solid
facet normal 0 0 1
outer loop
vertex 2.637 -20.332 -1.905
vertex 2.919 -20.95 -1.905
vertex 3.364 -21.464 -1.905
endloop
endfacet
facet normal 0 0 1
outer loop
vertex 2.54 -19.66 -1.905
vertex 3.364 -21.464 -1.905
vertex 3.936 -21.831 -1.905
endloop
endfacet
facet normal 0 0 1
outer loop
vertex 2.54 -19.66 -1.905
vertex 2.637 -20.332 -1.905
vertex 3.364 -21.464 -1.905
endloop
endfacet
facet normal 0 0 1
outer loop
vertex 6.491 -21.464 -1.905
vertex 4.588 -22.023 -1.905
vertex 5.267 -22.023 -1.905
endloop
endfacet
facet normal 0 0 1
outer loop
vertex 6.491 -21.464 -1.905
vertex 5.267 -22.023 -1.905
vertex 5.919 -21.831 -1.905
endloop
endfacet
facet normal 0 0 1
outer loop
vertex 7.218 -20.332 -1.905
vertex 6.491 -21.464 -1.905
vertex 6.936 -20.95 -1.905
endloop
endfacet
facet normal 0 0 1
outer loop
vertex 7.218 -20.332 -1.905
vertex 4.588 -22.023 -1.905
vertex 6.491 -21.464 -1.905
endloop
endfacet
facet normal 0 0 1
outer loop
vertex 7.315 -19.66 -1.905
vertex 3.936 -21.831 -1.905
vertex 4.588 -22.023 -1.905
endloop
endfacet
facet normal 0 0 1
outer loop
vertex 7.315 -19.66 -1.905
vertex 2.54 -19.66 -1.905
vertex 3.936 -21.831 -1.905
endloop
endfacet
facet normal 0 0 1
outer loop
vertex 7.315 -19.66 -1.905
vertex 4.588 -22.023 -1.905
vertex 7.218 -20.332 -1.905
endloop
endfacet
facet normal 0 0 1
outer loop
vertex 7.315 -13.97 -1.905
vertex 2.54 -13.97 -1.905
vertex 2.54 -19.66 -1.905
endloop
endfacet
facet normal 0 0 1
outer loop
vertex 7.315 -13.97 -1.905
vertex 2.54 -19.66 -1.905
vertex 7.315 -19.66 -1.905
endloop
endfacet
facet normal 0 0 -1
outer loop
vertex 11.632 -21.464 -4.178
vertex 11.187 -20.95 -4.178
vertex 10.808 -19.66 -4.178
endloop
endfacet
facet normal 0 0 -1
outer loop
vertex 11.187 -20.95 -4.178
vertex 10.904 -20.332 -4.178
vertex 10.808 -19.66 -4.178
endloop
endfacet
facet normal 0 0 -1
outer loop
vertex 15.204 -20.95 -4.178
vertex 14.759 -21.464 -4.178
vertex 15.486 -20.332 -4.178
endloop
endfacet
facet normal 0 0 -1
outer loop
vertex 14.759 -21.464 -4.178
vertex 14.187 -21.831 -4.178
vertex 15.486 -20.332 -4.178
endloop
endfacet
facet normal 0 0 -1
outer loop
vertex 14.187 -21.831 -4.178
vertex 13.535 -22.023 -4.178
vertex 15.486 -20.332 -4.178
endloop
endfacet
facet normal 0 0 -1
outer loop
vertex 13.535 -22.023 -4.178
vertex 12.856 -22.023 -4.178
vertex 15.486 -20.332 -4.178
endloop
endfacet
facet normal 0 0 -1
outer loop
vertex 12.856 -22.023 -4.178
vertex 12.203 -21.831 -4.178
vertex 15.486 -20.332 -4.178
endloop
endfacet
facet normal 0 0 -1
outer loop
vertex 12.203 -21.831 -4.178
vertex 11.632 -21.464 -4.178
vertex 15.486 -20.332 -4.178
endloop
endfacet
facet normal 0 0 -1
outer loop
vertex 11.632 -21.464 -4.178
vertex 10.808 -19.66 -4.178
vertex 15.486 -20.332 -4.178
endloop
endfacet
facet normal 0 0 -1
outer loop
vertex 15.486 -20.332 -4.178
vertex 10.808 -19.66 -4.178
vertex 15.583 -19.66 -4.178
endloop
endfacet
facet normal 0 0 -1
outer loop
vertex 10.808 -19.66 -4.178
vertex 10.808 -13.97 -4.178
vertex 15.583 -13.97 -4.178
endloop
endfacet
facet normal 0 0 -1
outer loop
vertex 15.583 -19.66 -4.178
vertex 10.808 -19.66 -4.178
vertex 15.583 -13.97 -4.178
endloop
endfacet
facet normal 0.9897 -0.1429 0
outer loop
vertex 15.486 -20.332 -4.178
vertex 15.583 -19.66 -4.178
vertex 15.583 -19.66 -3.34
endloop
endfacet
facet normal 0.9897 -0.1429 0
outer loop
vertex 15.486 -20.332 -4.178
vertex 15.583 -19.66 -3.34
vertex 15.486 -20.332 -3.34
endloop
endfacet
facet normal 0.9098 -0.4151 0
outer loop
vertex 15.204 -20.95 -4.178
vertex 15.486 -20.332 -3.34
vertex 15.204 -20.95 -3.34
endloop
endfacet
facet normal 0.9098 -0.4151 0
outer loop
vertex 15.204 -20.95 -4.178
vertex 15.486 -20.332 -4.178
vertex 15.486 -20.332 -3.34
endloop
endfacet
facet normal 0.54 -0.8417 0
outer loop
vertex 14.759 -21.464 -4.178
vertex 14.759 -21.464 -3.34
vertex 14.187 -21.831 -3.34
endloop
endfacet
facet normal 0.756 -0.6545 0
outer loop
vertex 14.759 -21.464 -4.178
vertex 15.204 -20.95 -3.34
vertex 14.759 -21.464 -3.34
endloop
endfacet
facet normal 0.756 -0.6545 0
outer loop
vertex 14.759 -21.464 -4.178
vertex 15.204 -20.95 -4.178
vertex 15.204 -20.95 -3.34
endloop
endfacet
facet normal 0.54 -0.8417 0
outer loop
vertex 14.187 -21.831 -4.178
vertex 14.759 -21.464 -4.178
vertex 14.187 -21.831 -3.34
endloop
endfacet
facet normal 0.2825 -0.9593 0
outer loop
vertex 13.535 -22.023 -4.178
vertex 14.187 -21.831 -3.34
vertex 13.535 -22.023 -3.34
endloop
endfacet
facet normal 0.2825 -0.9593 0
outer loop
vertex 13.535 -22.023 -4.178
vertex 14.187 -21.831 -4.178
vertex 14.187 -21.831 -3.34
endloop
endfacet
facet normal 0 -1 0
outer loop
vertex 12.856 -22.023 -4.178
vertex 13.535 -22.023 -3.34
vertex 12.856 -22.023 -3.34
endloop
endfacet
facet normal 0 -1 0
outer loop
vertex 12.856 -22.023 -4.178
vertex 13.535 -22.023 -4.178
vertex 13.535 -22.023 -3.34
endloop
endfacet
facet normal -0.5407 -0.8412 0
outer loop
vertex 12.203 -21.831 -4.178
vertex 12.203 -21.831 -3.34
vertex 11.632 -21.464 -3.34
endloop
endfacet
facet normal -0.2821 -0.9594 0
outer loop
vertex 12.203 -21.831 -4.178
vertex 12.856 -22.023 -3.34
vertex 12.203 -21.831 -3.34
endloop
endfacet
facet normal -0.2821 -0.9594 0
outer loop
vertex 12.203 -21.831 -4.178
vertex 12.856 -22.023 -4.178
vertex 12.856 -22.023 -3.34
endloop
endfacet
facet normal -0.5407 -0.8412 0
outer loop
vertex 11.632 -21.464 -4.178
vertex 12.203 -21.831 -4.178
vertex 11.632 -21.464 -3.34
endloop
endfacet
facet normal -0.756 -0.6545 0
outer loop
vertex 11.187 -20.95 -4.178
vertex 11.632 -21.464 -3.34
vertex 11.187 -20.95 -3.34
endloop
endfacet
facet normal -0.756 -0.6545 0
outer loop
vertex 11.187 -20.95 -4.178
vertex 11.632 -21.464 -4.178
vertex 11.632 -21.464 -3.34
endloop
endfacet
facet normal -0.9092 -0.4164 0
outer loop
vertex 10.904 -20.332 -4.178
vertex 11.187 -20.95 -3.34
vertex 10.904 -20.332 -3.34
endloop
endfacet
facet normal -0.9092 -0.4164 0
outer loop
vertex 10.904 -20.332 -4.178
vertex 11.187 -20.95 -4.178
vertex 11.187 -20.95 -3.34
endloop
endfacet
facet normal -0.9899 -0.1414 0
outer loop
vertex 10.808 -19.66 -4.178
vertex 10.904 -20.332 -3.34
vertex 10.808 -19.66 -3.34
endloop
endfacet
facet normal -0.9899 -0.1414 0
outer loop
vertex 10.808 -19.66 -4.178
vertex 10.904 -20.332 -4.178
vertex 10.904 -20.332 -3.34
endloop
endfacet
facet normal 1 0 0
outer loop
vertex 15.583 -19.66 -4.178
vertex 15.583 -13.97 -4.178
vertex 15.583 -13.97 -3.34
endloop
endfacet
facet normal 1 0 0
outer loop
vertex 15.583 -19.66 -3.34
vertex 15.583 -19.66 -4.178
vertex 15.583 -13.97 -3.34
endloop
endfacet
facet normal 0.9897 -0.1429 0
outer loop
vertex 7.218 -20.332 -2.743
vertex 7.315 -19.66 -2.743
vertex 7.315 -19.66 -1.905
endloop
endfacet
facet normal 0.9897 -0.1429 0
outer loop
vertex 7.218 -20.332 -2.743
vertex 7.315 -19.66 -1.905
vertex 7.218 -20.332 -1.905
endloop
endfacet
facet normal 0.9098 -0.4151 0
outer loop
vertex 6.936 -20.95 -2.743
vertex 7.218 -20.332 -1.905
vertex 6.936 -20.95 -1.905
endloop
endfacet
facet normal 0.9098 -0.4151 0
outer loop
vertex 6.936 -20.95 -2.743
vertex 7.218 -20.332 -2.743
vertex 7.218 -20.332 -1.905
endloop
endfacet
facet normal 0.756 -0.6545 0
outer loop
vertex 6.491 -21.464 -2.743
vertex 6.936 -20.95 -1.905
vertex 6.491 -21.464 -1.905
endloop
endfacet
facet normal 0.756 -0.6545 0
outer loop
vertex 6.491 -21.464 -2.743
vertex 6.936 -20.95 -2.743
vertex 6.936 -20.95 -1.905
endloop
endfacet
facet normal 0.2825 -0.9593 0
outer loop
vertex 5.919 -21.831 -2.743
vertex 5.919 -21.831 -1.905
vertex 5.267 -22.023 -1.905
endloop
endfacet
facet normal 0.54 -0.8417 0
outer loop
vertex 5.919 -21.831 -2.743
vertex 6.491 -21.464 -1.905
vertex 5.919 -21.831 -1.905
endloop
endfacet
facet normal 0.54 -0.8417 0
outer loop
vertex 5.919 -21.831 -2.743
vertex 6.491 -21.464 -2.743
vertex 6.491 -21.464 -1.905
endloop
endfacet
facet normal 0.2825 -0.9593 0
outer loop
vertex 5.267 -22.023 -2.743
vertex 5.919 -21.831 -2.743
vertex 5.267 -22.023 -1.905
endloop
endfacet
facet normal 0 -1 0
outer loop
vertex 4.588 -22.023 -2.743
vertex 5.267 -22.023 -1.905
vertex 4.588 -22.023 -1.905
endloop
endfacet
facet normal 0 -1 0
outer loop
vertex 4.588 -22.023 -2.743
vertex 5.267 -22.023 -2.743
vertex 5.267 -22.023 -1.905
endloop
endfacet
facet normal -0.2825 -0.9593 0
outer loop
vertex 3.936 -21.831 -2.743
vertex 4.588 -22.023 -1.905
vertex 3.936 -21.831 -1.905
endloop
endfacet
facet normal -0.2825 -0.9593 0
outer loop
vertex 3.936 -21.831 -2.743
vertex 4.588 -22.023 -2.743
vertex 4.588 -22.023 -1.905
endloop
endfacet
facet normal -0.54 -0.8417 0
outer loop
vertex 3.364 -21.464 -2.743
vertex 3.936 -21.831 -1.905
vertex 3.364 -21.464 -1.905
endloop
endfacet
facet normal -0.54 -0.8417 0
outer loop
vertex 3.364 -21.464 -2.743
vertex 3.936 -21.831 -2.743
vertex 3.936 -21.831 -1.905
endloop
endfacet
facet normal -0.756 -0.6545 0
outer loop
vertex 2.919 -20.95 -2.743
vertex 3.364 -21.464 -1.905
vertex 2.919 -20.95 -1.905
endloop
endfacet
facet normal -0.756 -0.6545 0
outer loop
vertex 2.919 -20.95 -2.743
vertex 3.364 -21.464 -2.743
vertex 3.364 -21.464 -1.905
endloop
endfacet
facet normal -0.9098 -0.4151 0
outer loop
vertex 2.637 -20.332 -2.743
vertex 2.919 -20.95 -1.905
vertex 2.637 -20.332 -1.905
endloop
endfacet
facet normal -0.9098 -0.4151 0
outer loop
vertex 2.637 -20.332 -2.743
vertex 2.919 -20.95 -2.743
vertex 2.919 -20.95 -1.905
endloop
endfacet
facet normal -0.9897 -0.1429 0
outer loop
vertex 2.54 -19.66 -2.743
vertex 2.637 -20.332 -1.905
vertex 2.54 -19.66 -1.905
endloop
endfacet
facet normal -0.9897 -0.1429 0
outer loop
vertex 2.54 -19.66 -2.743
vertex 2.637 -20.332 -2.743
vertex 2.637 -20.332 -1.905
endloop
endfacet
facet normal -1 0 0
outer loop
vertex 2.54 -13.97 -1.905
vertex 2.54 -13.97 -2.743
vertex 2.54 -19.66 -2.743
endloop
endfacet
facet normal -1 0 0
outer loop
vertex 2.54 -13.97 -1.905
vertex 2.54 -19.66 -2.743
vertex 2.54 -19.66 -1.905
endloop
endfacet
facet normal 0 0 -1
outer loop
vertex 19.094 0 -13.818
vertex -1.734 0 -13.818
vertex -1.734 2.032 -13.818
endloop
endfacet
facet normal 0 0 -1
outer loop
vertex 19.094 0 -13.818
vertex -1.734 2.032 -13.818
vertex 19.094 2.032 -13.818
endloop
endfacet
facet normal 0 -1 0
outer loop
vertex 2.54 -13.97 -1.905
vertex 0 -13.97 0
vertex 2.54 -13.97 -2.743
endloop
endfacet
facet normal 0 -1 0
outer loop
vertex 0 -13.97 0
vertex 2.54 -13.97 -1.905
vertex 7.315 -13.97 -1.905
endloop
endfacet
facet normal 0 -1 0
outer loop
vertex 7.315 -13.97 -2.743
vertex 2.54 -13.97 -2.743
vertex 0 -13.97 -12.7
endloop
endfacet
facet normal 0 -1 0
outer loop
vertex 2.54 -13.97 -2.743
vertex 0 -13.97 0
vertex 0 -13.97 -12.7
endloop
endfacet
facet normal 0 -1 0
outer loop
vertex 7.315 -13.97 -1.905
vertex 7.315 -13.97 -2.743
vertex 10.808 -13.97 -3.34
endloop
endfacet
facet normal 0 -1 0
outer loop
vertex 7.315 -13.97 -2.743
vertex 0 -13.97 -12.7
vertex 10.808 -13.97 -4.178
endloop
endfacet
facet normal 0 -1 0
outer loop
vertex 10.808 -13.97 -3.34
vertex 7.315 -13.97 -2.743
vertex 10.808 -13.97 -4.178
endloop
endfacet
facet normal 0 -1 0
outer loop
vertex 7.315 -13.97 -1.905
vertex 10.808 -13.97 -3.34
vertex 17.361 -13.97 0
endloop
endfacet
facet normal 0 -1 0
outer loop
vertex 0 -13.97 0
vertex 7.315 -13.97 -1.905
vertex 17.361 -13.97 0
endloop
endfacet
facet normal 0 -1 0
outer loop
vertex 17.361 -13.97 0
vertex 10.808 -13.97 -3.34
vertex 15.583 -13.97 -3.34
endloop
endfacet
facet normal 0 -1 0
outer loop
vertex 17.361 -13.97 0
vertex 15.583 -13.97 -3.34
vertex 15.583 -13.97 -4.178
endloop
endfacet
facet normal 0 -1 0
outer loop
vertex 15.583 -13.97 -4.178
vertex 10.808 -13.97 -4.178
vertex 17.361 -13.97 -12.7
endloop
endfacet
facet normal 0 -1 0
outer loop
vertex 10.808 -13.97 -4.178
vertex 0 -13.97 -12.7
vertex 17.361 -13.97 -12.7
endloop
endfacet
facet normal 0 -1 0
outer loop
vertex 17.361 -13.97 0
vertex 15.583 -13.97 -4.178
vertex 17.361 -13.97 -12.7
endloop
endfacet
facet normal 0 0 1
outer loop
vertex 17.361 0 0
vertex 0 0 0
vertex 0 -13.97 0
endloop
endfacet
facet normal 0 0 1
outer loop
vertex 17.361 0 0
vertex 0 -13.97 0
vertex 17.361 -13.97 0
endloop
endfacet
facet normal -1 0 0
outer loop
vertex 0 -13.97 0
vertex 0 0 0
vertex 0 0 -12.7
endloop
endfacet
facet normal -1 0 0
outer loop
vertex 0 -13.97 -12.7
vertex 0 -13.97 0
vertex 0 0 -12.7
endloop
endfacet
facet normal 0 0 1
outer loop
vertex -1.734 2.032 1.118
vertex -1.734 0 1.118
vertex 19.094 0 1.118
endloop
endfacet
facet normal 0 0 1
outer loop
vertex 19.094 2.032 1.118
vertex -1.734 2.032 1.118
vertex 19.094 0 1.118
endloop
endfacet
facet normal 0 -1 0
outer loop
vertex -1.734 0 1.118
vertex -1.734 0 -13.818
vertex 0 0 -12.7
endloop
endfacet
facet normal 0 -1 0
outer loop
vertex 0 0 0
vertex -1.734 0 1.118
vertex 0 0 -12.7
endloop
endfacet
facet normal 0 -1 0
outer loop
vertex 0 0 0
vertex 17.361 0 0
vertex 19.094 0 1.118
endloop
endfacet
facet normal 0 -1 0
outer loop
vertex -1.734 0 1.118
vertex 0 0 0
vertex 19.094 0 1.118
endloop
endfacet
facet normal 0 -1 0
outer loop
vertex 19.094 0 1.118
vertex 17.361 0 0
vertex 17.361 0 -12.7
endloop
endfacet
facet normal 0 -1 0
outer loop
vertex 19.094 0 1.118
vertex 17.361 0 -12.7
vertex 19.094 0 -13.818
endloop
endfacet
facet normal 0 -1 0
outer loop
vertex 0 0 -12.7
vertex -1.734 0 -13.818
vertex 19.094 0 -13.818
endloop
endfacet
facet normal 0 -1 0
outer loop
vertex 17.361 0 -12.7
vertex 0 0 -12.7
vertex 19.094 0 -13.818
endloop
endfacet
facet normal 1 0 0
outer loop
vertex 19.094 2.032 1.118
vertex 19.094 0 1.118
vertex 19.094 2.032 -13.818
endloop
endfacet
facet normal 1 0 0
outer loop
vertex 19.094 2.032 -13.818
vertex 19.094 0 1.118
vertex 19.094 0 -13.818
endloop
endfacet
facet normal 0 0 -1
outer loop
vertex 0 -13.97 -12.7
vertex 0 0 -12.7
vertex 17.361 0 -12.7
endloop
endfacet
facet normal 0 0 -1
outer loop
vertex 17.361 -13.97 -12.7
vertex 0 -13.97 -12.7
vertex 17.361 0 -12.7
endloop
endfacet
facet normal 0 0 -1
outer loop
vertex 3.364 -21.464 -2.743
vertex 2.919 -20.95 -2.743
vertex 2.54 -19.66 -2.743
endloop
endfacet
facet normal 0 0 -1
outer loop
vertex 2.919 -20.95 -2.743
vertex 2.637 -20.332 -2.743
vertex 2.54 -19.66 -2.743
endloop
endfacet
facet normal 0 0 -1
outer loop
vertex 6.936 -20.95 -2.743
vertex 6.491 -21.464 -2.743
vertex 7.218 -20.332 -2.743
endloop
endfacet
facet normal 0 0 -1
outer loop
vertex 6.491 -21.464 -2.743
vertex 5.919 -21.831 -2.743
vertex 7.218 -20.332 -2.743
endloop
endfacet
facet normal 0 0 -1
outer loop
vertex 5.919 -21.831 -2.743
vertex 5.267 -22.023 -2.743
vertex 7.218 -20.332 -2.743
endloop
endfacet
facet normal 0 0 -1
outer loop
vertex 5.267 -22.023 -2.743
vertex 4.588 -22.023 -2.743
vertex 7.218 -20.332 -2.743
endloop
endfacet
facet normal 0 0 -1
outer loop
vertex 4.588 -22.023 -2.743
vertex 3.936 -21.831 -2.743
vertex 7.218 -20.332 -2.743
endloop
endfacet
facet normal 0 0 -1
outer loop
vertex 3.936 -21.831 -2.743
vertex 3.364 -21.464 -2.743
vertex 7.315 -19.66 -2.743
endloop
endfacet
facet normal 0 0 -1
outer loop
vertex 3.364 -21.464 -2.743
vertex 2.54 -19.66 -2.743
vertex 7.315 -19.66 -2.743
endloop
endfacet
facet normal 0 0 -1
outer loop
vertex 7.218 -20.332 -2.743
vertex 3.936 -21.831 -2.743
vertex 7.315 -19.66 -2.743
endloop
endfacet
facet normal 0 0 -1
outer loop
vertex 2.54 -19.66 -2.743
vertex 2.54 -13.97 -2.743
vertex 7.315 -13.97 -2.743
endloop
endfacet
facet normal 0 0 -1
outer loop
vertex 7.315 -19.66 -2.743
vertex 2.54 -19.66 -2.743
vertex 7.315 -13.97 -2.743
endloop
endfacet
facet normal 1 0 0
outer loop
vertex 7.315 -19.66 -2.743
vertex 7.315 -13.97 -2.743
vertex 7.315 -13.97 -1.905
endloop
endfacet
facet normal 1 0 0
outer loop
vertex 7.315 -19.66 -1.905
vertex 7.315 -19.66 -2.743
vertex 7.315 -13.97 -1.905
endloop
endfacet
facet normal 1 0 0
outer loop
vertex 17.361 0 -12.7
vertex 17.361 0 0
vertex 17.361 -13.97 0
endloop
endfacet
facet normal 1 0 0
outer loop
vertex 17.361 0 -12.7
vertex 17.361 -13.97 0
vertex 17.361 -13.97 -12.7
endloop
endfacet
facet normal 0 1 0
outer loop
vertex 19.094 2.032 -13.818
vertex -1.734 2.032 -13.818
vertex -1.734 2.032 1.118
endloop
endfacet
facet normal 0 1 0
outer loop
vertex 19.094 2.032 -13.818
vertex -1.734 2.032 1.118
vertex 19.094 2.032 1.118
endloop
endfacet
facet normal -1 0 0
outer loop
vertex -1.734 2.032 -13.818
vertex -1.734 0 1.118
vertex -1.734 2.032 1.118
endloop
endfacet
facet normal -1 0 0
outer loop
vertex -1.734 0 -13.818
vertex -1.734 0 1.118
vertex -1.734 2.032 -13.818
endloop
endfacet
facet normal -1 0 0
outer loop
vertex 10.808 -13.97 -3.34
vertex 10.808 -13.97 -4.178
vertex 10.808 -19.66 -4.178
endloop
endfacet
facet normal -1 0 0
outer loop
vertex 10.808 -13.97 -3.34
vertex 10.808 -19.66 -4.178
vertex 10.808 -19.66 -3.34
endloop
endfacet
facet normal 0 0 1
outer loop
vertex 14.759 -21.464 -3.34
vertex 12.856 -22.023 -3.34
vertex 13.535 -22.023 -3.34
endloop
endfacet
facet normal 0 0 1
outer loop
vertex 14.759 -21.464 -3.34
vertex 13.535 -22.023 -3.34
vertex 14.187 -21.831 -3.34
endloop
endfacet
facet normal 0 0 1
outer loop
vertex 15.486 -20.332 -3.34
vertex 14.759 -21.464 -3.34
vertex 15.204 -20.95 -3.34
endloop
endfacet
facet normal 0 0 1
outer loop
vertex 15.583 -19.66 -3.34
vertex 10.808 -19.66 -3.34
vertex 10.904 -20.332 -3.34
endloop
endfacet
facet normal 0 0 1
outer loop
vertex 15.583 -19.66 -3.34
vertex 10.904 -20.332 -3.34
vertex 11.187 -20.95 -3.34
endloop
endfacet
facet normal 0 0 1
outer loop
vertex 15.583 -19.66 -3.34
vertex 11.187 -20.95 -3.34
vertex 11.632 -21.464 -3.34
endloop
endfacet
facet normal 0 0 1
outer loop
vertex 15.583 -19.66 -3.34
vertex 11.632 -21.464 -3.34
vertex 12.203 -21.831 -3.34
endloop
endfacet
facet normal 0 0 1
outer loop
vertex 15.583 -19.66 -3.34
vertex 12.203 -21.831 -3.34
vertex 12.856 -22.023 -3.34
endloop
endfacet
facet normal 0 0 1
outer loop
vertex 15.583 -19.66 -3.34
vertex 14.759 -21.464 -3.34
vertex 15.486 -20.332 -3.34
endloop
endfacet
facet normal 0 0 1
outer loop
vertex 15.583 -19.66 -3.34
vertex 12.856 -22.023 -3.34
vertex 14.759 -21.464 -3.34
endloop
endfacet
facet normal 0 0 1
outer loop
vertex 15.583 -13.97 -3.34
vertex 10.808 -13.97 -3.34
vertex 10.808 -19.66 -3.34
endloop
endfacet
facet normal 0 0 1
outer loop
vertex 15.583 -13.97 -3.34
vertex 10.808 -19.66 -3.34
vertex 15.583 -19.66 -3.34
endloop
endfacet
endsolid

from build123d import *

# Parameters (mm, degrees)
SKETCH1_W           = 17.3609
SKETCH1_H           = 12.7
BOSS_EXTRUDE1_DEPTH = 13.97
SKETCH2_W           = 20.828
SKETCH2_H           = 14.9352
BOSS_EXTRUDE2_DEPTH = 2.032
SKETCH3_W           = 4.7752
SKETCH3_H           = 0.8382
BOSS_EXTRUDE3_DEPTH = 8.0772
FILLET1_RADIUS      = 2.3876
FILLET1_LENGTH      = 0.8382
FILLET2_RADIUS      = 2.3876
FILLET2_LENGTH      = 0.8382


with BuildPart() as part:
    # Sketch1 → Boss-Extrude1 (new body)
    with BuildSketch(Plane(origin=(0, 0, 0), x_dir=(1, 0, 0), z_dir=(0, 1, 0))):
        with Locations((8.68045, 6.35)):
            Rectangle(SKETCH1_W, SKETCH1_H)
    extrude(amount=-BOSS_EXTRUDE1_DEPTH)

    # Sketch2 → Boss-Extrude2 (add)
    with BuildSketch(Plane(origin=(0, 0, 0), x_dir=(1, 0, 0), z_dir=(0, 1, 0))):
        with Locations((8.68045, 6.35)):
            Rectangle(SKETCH2_W, SKETCH2_H)
    extrude(amount=BOSS_EXTRUDE2_DEPTH)

    # Sketch3 → Boss-Extrude3 (add)
    with BuildSketch(Plane.XZ.offset(13.97)):
        with Locations((4.9276, -2.3241)):
            Rectangle(SKETCH3_W, SKETCH3_H)
        with Locations((13.1953, -3.7592)):
            Rectangle(SKETCH3_W, SKETCH3_H)
    extrude(amount=BOSS_EXTRUDE3_DEPTH)

    # Fillet1: full round fillet: the end face becomes a half cylinder, R = half its width
    fillet1_face = Plane((4.9276, -22.0472, -2.3241), x_dir=(0, 0, -1), z_dir=(0, -1, 0))  # on the end face: x along it, z out of the body
    fillet1_slab = fillet1_face.offset(-FILLET1_RADIUS / 2) * Box(FILLET1_LENGTH, 2 * FILLET1_RADIUS, FILLET1_RADIUS, mode=Mode.PRIVATE)  # the body's end, R deep
    fillet1_round = Plane((4.9276, -19.6596, -2.3241), x_dir=(0, -1, 0), z_dir=(0, 0, -1)) * Cylinder(FILLET1_RADIUS, FILLET1_LENGTH, mode=Mode.PRIVATE)  # its axis R under the face
    add(fillet1_slab - fillet1_round, mode=Mode.SUBTRACT)

    # Fillet2: full round fillet: the end face becomes a half cylinder, R = half its width
    fillet2_face = Plane((13.1953, -22.0472, -3.7592), x_dir=(0, 0, -1), z_dir=(0, -1, 0))  # on the end face: x along it, z out of the body
    fillet2_slab = fillet2_face.offset(-FILLET2_RADIUS / 2) * Box(FILLET2_LENGTH, 2 * FILLET2_RADIUS, FILLET2_RADIUS, mode=Mode.PRIVATE)  # the body's end, R deep
    fillet2_round = Plane((13.1953, -19.6596, -3.7592), x_dir=(0, -1, 0), z_dir=(0, 0, -1)) * Cylinder(FILLET2_RADIUS, FILLET2_LENGTH, mode=Mode.PRIVATE)  # its axis R under the face
    add(fillet2_slab - fillet2_round, mode=Mode.SUBTRACT)


solid = part.part
